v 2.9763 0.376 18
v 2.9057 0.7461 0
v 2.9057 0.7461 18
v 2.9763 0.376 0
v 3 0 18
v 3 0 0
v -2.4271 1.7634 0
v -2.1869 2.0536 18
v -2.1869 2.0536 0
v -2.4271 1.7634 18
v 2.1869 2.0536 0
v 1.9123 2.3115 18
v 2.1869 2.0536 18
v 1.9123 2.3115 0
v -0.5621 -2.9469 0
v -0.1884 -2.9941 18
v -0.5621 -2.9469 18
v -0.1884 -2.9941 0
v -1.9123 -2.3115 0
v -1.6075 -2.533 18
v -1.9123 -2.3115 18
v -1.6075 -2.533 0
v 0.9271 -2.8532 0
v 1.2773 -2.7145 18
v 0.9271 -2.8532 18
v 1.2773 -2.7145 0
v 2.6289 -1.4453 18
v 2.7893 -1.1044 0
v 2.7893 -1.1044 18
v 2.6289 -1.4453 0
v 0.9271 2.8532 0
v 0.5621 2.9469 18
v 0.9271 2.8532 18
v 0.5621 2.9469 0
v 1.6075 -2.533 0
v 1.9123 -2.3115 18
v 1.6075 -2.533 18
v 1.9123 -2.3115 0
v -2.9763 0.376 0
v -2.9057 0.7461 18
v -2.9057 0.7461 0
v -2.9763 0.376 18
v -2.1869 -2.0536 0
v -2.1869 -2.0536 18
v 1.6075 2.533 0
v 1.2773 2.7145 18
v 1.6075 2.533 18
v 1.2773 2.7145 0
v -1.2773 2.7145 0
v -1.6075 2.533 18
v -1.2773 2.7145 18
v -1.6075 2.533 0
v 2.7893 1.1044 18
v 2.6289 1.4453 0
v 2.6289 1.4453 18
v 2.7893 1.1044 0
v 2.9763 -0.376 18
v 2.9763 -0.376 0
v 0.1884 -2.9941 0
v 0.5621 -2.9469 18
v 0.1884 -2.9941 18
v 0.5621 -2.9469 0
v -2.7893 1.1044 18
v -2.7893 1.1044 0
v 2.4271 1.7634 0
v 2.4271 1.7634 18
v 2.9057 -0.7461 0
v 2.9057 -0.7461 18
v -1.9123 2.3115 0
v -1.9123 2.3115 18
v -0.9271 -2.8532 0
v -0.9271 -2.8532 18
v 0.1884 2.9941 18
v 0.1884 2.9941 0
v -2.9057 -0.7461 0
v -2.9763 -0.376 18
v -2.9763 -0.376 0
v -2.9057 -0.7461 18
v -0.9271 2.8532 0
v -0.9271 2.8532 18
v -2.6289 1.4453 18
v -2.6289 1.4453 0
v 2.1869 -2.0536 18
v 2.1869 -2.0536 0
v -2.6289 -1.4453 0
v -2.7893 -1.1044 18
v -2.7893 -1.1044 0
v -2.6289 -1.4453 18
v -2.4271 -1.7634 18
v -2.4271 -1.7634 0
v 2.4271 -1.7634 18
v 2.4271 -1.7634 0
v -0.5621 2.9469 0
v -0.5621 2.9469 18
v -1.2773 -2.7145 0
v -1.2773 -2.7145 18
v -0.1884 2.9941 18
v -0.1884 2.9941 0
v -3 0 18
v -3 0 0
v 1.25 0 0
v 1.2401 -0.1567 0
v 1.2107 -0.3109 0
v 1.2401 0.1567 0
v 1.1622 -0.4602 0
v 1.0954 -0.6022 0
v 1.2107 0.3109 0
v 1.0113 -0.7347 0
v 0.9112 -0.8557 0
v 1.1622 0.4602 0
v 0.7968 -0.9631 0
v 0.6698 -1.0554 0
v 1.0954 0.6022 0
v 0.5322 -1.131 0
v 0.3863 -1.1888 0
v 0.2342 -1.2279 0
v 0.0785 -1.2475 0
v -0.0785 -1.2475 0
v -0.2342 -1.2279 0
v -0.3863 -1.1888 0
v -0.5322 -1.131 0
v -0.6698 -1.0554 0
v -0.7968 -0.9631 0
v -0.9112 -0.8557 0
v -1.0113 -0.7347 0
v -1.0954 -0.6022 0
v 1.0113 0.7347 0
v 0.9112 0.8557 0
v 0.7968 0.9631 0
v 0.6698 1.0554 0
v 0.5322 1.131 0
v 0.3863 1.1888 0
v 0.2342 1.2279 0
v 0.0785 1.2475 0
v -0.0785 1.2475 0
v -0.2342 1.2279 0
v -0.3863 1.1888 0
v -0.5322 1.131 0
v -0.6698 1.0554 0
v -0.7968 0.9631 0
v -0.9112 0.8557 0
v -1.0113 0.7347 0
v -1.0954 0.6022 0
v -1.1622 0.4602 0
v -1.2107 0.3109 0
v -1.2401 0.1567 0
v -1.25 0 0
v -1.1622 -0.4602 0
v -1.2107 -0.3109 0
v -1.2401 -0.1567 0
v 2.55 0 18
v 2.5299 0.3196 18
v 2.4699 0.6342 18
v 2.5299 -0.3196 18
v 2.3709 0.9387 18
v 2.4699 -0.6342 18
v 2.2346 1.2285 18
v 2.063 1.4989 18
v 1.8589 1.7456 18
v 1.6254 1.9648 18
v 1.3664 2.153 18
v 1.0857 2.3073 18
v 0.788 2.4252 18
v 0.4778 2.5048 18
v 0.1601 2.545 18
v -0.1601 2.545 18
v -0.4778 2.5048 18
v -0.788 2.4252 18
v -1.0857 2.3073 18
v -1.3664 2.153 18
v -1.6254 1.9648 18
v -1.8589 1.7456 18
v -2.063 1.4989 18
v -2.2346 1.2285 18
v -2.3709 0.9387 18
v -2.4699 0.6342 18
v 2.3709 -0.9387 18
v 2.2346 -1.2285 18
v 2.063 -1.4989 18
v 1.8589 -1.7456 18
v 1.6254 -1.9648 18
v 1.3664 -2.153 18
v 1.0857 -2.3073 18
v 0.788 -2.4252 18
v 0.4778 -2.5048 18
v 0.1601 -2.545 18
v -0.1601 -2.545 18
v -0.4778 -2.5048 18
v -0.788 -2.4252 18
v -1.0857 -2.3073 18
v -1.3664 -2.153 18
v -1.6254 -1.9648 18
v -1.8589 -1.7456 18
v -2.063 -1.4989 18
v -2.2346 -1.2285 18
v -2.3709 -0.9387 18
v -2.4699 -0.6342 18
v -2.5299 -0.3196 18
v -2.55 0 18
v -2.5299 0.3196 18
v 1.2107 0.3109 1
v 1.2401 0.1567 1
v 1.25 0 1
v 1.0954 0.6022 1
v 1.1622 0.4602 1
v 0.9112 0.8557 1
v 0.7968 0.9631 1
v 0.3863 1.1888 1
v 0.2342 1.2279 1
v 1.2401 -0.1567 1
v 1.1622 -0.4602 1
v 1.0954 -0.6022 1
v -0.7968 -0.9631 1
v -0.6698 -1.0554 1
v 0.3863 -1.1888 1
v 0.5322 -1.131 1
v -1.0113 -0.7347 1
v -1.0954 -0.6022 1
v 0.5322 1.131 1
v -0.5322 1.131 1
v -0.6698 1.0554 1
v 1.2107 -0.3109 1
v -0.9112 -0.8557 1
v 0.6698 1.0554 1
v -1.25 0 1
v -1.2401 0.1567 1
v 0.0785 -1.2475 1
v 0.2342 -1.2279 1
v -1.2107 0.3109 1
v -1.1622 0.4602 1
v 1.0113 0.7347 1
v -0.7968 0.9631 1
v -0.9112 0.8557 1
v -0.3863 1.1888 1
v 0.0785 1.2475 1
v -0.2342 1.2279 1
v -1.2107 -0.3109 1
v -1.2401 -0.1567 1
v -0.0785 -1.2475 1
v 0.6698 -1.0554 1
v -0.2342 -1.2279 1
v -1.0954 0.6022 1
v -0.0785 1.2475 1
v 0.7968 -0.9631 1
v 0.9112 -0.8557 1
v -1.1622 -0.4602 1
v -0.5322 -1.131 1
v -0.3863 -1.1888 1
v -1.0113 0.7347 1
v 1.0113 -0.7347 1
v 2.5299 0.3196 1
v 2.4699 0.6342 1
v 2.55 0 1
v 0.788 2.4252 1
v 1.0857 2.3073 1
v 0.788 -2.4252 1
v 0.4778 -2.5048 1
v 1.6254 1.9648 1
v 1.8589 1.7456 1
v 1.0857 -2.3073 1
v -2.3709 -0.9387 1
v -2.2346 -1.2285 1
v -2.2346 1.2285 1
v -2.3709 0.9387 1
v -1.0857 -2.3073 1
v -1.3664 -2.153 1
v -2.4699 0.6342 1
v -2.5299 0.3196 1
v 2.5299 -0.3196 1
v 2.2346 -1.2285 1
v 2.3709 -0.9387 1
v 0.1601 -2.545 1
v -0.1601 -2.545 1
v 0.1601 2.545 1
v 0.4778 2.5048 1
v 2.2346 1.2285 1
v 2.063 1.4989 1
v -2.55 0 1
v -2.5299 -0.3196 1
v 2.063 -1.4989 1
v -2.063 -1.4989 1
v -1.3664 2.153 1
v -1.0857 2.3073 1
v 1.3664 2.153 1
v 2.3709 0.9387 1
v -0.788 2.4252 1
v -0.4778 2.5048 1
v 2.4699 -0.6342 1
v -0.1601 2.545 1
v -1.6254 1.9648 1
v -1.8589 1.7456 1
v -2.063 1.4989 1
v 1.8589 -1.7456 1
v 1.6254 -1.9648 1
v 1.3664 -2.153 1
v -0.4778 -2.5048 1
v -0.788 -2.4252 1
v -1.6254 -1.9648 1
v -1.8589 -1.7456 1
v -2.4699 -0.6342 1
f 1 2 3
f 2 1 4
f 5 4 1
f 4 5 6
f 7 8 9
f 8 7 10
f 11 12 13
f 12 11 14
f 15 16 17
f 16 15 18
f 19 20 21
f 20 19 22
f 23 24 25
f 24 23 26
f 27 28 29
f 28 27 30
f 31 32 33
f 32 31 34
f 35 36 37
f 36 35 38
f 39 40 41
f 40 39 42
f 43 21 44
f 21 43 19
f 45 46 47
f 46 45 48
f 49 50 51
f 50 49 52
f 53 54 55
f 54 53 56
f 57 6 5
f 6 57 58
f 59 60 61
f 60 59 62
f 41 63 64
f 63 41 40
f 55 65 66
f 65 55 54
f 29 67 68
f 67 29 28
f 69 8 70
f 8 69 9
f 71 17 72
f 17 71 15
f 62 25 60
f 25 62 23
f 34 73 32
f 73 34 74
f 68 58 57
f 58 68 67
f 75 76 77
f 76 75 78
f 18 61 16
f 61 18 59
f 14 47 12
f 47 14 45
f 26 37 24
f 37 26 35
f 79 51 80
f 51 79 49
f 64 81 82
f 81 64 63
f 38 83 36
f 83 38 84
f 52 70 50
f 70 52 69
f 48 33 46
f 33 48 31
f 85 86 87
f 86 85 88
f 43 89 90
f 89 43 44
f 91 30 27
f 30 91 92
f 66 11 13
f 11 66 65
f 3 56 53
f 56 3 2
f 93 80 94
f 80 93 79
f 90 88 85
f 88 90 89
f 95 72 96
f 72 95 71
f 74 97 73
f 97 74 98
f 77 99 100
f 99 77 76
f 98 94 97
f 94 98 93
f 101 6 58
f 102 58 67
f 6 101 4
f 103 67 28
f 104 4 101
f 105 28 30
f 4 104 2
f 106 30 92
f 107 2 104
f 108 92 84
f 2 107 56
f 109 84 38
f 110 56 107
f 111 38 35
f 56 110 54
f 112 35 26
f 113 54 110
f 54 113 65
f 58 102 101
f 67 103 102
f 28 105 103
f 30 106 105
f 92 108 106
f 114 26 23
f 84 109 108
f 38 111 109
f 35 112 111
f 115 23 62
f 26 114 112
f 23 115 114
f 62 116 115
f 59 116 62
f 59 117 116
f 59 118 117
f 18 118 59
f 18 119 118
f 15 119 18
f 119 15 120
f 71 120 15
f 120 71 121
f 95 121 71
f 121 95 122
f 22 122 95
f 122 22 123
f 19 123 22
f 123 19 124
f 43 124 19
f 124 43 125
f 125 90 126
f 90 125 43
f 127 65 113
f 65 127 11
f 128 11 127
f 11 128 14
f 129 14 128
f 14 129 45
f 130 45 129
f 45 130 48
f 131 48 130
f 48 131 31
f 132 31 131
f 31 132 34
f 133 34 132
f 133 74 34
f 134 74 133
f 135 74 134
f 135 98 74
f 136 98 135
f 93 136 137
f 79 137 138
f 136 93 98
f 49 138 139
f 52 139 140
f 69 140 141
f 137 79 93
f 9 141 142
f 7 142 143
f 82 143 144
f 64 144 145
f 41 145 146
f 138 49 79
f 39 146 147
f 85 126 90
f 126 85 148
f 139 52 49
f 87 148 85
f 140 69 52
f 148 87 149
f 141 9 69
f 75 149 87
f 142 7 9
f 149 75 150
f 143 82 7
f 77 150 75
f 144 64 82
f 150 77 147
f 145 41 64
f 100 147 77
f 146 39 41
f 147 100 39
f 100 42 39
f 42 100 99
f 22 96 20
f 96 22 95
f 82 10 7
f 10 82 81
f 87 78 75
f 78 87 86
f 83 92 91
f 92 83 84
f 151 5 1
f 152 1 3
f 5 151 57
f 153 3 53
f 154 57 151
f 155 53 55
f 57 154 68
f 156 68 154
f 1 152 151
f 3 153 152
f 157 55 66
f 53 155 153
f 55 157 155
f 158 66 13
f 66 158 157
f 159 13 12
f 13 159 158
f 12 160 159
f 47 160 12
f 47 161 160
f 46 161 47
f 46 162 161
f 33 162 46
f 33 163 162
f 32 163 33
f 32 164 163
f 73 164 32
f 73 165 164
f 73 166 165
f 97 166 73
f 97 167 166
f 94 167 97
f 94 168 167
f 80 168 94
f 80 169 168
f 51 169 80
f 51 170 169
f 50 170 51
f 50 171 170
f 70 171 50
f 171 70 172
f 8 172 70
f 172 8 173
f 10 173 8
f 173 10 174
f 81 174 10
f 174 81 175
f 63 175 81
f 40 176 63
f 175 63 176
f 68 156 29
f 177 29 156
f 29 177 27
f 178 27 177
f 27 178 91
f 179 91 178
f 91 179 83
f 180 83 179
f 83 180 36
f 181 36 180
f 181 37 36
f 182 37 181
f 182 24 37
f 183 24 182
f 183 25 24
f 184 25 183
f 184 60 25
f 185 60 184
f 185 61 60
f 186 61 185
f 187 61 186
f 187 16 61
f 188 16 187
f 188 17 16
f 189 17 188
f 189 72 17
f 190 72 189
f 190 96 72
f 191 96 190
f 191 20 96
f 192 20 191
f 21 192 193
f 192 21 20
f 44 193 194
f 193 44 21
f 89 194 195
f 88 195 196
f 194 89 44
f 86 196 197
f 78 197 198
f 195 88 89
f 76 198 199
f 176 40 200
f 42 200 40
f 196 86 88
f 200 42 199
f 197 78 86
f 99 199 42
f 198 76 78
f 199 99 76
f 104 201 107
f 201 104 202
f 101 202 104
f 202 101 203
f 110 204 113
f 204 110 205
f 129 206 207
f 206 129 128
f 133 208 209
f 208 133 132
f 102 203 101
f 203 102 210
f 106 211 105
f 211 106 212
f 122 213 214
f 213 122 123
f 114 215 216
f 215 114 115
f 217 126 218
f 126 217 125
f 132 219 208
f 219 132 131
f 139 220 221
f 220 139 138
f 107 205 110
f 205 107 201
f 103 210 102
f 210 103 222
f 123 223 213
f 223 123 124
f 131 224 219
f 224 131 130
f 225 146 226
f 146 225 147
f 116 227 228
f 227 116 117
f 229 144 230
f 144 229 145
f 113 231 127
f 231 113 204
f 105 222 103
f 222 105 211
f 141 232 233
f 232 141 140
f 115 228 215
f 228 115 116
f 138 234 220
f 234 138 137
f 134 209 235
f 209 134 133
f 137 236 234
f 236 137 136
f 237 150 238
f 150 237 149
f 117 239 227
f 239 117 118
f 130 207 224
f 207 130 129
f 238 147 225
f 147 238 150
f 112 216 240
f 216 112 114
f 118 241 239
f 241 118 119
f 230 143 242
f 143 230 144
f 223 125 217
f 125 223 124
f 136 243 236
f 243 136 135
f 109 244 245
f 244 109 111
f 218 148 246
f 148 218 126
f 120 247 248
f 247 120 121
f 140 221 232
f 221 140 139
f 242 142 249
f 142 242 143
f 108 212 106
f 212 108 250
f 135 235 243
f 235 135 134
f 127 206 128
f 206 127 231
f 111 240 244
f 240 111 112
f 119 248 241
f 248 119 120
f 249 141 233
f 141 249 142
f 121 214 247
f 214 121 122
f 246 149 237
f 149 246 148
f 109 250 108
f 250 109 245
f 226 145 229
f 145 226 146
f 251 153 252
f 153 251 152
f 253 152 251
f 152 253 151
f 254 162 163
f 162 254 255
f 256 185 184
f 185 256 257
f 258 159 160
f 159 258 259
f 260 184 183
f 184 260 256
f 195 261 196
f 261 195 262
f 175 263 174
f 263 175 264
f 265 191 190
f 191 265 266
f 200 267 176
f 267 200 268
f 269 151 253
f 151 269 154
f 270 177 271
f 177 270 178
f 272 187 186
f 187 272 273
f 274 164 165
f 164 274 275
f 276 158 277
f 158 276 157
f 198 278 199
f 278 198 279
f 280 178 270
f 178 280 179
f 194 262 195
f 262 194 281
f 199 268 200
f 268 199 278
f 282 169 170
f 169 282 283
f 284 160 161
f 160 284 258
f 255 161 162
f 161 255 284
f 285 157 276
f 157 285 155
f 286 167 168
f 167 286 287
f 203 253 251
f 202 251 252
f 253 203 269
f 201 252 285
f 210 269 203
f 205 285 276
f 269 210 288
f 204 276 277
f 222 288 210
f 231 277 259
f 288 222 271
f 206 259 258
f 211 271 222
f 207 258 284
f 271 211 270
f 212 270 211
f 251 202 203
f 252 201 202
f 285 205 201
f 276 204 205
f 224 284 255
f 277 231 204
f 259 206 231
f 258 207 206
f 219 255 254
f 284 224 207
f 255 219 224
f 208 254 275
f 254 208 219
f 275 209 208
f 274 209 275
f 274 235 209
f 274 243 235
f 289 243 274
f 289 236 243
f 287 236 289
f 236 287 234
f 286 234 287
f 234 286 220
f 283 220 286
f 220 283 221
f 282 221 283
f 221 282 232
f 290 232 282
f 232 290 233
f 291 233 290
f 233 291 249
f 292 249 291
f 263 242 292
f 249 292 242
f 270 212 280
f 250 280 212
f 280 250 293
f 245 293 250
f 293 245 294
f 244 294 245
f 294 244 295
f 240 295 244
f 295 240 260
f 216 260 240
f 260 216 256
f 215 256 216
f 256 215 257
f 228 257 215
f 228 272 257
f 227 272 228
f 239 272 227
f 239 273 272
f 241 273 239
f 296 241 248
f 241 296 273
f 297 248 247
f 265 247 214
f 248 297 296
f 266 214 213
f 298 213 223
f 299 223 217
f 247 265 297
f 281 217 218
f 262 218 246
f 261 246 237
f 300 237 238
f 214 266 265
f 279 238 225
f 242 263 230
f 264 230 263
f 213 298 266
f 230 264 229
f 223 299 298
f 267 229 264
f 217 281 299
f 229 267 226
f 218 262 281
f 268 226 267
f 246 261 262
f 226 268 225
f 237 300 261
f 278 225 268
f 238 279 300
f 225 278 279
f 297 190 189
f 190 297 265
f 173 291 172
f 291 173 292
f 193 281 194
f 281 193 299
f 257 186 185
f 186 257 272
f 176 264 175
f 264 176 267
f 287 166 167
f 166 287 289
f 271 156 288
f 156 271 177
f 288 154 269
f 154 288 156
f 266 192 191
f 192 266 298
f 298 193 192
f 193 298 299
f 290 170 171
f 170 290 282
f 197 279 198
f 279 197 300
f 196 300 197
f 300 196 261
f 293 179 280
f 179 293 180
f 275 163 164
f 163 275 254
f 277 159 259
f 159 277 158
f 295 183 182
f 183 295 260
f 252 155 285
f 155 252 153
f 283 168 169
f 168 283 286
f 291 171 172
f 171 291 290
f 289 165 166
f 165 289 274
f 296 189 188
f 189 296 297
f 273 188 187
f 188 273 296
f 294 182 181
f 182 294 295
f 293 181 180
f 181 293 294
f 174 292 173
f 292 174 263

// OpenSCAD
$fn=50;

height=18;

difference()
{
	cylinder(d=6, h=height);
	translate([0,0,-0.1])cylinder(d=2.5, h=height+1);
	translate([0,0,1]) cylinder(d=5.1, h=height);
}
